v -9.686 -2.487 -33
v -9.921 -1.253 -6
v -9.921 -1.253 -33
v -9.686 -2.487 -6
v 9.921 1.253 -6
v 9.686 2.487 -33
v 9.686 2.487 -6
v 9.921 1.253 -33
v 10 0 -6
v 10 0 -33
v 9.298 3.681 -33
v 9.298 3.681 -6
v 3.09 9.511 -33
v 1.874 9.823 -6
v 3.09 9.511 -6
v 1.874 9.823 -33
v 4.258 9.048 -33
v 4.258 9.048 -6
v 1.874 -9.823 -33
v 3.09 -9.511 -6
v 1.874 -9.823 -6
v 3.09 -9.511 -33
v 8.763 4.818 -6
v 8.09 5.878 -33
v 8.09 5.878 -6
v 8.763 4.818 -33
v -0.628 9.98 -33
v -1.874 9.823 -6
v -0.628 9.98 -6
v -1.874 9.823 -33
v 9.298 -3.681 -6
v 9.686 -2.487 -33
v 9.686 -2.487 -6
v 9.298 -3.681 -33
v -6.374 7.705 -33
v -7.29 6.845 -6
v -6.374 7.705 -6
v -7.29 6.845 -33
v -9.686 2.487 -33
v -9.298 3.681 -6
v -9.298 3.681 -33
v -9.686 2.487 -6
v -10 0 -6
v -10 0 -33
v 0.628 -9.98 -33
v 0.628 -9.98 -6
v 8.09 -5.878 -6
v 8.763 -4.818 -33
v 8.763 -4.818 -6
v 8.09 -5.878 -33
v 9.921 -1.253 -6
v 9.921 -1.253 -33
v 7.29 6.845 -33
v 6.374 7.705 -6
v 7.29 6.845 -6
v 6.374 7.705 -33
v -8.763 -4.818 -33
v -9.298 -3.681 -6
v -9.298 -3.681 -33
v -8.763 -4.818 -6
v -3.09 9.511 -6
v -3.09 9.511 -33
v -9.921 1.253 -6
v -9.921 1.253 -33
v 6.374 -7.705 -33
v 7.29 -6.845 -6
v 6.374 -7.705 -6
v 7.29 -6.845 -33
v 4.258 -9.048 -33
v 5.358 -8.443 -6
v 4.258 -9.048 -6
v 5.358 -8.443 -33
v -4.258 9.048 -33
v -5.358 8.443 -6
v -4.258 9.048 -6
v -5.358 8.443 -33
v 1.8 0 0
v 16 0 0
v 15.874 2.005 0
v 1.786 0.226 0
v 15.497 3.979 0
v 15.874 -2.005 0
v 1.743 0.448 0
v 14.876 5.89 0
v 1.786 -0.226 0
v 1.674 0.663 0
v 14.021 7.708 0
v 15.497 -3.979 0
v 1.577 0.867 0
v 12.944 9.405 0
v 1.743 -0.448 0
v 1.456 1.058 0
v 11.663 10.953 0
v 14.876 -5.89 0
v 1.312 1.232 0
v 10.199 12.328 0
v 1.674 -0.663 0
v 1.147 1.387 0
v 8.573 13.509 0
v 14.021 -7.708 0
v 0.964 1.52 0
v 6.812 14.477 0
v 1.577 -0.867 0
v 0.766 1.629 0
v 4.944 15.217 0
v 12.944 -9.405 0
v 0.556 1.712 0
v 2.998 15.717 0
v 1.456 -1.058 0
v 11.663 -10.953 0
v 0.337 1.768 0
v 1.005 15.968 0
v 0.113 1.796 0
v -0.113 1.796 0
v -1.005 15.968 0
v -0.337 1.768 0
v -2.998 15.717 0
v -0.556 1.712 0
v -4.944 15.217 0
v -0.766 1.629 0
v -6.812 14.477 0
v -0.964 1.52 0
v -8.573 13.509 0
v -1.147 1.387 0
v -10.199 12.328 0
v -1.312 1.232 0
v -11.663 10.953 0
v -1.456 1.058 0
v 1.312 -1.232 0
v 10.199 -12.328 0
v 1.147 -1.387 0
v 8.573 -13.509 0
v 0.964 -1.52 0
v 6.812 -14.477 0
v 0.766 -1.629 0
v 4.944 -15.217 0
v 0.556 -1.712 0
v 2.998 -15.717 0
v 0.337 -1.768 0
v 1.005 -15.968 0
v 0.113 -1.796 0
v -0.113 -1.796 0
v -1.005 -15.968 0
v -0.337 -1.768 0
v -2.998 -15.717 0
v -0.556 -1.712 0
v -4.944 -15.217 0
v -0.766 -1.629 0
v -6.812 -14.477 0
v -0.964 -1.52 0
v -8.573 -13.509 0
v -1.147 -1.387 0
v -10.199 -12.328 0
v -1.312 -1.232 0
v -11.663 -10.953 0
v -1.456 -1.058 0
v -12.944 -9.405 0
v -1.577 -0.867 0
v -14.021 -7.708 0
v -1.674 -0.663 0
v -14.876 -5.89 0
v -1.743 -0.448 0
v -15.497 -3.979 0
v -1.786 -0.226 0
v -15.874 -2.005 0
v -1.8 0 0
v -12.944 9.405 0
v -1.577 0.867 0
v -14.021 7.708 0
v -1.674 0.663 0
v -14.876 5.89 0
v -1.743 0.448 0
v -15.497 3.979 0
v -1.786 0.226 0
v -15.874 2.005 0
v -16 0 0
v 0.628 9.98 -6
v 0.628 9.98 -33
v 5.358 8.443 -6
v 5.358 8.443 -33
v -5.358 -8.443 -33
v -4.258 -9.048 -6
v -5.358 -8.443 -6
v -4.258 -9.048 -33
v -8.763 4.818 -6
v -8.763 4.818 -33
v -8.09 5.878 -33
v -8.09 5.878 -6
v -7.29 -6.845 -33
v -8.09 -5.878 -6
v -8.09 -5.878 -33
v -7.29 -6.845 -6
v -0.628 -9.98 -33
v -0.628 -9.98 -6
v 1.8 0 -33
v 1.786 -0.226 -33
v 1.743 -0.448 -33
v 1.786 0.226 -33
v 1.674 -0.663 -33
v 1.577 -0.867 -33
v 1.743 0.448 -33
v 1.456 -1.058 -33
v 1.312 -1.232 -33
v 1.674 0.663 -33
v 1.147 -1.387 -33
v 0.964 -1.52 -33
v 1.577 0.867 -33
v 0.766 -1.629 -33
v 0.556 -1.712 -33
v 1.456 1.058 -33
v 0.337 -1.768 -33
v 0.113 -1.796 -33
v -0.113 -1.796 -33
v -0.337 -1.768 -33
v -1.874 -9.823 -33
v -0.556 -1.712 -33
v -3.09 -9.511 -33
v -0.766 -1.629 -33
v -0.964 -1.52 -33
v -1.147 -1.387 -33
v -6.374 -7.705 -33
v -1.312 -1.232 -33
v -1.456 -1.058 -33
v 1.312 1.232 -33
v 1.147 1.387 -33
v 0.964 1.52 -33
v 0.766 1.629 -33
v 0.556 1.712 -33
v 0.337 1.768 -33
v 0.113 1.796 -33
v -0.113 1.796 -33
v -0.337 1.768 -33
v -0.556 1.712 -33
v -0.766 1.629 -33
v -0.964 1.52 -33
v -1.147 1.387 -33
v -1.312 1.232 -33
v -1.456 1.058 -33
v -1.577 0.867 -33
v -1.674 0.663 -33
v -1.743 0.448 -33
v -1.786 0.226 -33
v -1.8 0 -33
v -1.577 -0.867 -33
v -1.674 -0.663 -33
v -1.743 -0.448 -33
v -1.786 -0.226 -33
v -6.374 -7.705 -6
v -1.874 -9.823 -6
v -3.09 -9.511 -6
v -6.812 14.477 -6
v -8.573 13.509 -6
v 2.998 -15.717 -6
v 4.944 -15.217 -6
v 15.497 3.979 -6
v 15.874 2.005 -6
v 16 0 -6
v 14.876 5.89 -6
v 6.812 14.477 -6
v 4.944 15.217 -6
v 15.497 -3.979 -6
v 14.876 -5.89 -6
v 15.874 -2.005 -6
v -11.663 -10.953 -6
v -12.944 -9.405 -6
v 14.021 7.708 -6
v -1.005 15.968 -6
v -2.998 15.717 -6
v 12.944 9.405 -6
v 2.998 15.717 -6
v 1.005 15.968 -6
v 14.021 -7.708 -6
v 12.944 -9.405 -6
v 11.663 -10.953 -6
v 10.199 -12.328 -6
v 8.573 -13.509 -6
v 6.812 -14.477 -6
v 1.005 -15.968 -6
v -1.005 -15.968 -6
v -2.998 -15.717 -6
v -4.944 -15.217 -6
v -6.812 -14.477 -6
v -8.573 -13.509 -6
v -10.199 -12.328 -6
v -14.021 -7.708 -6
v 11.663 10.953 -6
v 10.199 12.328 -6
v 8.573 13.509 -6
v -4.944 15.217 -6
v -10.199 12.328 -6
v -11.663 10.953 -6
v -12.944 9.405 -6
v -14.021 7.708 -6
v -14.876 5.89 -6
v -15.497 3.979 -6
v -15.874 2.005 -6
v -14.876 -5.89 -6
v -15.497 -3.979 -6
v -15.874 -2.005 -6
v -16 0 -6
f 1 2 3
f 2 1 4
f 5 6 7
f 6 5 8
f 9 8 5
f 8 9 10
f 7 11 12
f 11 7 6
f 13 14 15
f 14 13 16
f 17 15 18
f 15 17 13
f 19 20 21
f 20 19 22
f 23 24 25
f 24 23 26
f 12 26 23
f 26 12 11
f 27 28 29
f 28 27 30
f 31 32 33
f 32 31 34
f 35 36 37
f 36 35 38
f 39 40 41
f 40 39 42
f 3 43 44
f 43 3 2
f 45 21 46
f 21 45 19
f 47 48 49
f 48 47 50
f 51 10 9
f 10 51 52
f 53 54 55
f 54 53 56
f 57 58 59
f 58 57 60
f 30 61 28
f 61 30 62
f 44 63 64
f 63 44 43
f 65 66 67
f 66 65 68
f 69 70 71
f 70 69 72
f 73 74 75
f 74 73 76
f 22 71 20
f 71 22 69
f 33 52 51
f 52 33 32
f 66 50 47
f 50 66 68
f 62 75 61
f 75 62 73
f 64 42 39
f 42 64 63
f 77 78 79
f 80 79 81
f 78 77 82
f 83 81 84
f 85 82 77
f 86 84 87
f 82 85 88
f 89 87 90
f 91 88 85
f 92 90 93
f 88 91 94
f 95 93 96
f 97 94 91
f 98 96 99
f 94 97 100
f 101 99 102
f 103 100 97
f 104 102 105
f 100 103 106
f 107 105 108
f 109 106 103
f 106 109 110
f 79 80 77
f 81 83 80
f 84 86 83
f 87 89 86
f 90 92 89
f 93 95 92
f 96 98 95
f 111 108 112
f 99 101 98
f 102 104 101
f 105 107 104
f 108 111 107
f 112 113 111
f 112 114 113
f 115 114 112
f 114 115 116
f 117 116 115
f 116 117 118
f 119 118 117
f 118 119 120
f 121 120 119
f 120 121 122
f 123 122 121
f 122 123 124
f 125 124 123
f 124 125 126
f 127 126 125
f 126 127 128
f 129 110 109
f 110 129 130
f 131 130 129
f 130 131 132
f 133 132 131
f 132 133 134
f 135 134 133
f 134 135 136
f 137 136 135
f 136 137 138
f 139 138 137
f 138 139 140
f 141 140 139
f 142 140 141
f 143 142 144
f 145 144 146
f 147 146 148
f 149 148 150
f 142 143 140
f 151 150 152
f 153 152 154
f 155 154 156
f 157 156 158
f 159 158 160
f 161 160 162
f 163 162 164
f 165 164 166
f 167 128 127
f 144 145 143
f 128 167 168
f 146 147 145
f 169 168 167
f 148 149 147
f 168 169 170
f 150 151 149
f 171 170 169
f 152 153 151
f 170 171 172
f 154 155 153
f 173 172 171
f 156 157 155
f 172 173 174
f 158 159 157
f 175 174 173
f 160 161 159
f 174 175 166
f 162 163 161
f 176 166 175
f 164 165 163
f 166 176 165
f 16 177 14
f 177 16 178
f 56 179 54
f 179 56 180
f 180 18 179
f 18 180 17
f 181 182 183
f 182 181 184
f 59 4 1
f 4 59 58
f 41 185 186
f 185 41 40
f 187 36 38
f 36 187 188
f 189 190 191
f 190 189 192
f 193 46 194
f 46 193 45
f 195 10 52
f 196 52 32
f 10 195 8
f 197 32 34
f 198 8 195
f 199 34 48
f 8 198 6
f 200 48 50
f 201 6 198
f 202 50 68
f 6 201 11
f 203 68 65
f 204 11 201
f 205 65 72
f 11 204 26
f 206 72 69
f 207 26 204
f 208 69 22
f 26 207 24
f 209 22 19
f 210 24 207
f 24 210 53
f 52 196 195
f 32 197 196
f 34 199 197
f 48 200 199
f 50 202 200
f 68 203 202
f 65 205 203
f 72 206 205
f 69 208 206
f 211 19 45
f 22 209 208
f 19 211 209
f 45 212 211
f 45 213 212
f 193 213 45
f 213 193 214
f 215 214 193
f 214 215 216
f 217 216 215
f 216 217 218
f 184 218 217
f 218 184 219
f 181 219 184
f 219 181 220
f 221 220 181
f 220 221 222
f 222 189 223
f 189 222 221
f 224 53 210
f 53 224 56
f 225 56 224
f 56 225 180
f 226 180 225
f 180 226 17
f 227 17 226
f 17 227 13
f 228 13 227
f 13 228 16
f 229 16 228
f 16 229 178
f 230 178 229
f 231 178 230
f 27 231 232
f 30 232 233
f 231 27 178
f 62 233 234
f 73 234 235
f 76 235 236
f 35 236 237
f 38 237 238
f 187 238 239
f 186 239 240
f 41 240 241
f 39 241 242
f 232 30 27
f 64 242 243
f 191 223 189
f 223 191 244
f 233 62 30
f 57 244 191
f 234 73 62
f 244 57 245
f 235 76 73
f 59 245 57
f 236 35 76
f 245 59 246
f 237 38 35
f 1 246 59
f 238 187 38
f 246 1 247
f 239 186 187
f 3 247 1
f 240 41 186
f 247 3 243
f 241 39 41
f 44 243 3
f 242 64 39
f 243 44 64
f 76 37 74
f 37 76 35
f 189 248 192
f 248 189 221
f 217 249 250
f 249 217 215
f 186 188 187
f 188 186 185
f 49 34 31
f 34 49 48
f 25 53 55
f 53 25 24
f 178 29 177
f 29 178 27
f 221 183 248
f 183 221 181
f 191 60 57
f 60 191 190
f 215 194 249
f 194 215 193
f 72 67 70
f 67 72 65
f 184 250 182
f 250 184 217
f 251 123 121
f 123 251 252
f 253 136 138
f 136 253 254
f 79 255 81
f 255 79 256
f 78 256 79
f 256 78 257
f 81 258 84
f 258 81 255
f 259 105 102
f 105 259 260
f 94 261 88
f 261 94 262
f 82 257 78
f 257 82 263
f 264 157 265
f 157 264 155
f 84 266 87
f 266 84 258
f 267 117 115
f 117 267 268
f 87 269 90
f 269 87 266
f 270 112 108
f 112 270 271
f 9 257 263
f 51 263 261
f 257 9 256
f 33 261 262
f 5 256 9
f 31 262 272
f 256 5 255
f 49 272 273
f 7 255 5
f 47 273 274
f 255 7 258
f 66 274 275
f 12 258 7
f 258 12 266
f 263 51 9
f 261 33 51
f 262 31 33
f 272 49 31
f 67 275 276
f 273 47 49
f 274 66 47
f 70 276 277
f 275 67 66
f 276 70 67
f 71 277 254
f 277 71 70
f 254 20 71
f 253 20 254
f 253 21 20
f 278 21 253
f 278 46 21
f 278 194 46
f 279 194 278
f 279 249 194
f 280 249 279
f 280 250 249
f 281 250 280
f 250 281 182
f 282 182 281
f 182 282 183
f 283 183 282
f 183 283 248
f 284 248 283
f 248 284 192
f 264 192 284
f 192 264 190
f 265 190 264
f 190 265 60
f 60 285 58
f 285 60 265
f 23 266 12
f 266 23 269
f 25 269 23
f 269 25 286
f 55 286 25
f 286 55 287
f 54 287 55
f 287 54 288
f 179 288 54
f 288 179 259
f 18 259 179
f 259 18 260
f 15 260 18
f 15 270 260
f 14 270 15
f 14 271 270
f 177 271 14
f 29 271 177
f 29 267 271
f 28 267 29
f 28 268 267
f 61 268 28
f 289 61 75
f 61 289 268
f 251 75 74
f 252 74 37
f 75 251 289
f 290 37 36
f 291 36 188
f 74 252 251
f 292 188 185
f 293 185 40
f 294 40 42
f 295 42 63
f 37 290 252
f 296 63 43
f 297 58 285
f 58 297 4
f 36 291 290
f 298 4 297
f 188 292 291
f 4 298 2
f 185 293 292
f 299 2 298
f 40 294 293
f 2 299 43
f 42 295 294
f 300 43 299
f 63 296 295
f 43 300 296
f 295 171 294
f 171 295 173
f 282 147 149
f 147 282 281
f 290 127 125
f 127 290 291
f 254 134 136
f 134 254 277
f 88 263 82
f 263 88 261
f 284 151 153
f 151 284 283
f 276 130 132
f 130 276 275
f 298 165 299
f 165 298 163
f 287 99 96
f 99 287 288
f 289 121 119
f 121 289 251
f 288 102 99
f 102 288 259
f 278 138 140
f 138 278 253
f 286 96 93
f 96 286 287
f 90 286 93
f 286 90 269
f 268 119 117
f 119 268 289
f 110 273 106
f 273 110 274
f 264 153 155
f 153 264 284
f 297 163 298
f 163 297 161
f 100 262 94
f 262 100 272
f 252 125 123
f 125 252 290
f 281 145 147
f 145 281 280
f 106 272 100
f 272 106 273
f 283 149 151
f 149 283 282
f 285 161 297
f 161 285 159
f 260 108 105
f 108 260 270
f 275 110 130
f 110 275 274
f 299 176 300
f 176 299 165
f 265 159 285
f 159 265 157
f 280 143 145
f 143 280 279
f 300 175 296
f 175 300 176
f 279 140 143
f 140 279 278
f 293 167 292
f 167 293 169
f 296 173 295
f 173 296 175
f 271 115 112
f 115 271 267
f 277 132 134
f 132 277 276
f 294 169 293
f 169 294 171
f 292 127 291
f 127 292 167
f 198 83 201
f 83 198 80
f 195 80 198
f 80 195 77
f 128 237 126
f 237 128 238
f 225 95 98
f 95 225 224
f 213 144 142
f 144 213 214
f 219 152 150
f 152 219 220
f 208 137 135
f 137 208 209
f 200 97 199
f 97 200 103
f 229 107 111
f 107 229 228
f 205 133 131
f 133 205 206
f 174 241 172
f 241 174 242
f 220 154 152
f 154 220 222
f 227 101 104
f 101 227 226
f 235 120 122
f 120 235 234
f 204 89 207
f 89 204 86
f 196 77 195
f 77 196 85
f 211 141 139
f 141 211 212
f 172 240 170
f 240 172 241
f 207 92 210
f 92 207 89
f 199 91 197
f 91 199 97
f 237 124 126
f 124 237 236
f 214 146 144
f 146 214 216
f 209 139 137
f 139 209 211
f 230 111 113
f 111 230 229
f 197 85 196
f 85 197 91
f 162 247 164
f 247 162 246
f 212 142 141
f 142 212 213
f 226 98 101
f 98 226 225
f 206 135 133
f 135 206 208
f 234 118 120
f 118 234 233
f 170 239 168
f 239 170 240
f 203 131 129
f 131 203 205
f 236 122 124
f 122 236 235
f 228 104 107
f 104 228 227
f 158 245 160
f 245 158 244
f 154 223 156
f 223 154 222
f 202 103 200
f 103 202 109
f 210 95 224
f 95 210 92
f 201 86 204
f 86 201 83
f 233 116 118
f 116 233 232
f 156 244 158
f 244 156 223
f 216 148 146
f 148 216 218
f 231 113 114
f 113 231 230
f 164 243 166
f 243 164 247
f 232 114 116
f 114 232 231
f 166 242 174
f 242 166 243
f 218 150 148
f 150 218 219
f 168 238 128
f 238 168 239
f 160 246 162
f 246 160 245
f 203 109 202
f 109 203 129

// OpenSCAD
$fn = 50;


difference() {
	union() {
		translate(v = [0, 0, -33.0000000000]) {
			cylinder(h = 33, r = 10.0000000000);
		}
		translate(v = [0, 0, -6.0000000000]) {
			cylinder(h = 6, r = 16.0000000000);
		}
	}
	union() {
		#translate(v = [0, 0, -33]) {
			cylinder(h = 33, r = 1.8000000000);
		}
	}
}
